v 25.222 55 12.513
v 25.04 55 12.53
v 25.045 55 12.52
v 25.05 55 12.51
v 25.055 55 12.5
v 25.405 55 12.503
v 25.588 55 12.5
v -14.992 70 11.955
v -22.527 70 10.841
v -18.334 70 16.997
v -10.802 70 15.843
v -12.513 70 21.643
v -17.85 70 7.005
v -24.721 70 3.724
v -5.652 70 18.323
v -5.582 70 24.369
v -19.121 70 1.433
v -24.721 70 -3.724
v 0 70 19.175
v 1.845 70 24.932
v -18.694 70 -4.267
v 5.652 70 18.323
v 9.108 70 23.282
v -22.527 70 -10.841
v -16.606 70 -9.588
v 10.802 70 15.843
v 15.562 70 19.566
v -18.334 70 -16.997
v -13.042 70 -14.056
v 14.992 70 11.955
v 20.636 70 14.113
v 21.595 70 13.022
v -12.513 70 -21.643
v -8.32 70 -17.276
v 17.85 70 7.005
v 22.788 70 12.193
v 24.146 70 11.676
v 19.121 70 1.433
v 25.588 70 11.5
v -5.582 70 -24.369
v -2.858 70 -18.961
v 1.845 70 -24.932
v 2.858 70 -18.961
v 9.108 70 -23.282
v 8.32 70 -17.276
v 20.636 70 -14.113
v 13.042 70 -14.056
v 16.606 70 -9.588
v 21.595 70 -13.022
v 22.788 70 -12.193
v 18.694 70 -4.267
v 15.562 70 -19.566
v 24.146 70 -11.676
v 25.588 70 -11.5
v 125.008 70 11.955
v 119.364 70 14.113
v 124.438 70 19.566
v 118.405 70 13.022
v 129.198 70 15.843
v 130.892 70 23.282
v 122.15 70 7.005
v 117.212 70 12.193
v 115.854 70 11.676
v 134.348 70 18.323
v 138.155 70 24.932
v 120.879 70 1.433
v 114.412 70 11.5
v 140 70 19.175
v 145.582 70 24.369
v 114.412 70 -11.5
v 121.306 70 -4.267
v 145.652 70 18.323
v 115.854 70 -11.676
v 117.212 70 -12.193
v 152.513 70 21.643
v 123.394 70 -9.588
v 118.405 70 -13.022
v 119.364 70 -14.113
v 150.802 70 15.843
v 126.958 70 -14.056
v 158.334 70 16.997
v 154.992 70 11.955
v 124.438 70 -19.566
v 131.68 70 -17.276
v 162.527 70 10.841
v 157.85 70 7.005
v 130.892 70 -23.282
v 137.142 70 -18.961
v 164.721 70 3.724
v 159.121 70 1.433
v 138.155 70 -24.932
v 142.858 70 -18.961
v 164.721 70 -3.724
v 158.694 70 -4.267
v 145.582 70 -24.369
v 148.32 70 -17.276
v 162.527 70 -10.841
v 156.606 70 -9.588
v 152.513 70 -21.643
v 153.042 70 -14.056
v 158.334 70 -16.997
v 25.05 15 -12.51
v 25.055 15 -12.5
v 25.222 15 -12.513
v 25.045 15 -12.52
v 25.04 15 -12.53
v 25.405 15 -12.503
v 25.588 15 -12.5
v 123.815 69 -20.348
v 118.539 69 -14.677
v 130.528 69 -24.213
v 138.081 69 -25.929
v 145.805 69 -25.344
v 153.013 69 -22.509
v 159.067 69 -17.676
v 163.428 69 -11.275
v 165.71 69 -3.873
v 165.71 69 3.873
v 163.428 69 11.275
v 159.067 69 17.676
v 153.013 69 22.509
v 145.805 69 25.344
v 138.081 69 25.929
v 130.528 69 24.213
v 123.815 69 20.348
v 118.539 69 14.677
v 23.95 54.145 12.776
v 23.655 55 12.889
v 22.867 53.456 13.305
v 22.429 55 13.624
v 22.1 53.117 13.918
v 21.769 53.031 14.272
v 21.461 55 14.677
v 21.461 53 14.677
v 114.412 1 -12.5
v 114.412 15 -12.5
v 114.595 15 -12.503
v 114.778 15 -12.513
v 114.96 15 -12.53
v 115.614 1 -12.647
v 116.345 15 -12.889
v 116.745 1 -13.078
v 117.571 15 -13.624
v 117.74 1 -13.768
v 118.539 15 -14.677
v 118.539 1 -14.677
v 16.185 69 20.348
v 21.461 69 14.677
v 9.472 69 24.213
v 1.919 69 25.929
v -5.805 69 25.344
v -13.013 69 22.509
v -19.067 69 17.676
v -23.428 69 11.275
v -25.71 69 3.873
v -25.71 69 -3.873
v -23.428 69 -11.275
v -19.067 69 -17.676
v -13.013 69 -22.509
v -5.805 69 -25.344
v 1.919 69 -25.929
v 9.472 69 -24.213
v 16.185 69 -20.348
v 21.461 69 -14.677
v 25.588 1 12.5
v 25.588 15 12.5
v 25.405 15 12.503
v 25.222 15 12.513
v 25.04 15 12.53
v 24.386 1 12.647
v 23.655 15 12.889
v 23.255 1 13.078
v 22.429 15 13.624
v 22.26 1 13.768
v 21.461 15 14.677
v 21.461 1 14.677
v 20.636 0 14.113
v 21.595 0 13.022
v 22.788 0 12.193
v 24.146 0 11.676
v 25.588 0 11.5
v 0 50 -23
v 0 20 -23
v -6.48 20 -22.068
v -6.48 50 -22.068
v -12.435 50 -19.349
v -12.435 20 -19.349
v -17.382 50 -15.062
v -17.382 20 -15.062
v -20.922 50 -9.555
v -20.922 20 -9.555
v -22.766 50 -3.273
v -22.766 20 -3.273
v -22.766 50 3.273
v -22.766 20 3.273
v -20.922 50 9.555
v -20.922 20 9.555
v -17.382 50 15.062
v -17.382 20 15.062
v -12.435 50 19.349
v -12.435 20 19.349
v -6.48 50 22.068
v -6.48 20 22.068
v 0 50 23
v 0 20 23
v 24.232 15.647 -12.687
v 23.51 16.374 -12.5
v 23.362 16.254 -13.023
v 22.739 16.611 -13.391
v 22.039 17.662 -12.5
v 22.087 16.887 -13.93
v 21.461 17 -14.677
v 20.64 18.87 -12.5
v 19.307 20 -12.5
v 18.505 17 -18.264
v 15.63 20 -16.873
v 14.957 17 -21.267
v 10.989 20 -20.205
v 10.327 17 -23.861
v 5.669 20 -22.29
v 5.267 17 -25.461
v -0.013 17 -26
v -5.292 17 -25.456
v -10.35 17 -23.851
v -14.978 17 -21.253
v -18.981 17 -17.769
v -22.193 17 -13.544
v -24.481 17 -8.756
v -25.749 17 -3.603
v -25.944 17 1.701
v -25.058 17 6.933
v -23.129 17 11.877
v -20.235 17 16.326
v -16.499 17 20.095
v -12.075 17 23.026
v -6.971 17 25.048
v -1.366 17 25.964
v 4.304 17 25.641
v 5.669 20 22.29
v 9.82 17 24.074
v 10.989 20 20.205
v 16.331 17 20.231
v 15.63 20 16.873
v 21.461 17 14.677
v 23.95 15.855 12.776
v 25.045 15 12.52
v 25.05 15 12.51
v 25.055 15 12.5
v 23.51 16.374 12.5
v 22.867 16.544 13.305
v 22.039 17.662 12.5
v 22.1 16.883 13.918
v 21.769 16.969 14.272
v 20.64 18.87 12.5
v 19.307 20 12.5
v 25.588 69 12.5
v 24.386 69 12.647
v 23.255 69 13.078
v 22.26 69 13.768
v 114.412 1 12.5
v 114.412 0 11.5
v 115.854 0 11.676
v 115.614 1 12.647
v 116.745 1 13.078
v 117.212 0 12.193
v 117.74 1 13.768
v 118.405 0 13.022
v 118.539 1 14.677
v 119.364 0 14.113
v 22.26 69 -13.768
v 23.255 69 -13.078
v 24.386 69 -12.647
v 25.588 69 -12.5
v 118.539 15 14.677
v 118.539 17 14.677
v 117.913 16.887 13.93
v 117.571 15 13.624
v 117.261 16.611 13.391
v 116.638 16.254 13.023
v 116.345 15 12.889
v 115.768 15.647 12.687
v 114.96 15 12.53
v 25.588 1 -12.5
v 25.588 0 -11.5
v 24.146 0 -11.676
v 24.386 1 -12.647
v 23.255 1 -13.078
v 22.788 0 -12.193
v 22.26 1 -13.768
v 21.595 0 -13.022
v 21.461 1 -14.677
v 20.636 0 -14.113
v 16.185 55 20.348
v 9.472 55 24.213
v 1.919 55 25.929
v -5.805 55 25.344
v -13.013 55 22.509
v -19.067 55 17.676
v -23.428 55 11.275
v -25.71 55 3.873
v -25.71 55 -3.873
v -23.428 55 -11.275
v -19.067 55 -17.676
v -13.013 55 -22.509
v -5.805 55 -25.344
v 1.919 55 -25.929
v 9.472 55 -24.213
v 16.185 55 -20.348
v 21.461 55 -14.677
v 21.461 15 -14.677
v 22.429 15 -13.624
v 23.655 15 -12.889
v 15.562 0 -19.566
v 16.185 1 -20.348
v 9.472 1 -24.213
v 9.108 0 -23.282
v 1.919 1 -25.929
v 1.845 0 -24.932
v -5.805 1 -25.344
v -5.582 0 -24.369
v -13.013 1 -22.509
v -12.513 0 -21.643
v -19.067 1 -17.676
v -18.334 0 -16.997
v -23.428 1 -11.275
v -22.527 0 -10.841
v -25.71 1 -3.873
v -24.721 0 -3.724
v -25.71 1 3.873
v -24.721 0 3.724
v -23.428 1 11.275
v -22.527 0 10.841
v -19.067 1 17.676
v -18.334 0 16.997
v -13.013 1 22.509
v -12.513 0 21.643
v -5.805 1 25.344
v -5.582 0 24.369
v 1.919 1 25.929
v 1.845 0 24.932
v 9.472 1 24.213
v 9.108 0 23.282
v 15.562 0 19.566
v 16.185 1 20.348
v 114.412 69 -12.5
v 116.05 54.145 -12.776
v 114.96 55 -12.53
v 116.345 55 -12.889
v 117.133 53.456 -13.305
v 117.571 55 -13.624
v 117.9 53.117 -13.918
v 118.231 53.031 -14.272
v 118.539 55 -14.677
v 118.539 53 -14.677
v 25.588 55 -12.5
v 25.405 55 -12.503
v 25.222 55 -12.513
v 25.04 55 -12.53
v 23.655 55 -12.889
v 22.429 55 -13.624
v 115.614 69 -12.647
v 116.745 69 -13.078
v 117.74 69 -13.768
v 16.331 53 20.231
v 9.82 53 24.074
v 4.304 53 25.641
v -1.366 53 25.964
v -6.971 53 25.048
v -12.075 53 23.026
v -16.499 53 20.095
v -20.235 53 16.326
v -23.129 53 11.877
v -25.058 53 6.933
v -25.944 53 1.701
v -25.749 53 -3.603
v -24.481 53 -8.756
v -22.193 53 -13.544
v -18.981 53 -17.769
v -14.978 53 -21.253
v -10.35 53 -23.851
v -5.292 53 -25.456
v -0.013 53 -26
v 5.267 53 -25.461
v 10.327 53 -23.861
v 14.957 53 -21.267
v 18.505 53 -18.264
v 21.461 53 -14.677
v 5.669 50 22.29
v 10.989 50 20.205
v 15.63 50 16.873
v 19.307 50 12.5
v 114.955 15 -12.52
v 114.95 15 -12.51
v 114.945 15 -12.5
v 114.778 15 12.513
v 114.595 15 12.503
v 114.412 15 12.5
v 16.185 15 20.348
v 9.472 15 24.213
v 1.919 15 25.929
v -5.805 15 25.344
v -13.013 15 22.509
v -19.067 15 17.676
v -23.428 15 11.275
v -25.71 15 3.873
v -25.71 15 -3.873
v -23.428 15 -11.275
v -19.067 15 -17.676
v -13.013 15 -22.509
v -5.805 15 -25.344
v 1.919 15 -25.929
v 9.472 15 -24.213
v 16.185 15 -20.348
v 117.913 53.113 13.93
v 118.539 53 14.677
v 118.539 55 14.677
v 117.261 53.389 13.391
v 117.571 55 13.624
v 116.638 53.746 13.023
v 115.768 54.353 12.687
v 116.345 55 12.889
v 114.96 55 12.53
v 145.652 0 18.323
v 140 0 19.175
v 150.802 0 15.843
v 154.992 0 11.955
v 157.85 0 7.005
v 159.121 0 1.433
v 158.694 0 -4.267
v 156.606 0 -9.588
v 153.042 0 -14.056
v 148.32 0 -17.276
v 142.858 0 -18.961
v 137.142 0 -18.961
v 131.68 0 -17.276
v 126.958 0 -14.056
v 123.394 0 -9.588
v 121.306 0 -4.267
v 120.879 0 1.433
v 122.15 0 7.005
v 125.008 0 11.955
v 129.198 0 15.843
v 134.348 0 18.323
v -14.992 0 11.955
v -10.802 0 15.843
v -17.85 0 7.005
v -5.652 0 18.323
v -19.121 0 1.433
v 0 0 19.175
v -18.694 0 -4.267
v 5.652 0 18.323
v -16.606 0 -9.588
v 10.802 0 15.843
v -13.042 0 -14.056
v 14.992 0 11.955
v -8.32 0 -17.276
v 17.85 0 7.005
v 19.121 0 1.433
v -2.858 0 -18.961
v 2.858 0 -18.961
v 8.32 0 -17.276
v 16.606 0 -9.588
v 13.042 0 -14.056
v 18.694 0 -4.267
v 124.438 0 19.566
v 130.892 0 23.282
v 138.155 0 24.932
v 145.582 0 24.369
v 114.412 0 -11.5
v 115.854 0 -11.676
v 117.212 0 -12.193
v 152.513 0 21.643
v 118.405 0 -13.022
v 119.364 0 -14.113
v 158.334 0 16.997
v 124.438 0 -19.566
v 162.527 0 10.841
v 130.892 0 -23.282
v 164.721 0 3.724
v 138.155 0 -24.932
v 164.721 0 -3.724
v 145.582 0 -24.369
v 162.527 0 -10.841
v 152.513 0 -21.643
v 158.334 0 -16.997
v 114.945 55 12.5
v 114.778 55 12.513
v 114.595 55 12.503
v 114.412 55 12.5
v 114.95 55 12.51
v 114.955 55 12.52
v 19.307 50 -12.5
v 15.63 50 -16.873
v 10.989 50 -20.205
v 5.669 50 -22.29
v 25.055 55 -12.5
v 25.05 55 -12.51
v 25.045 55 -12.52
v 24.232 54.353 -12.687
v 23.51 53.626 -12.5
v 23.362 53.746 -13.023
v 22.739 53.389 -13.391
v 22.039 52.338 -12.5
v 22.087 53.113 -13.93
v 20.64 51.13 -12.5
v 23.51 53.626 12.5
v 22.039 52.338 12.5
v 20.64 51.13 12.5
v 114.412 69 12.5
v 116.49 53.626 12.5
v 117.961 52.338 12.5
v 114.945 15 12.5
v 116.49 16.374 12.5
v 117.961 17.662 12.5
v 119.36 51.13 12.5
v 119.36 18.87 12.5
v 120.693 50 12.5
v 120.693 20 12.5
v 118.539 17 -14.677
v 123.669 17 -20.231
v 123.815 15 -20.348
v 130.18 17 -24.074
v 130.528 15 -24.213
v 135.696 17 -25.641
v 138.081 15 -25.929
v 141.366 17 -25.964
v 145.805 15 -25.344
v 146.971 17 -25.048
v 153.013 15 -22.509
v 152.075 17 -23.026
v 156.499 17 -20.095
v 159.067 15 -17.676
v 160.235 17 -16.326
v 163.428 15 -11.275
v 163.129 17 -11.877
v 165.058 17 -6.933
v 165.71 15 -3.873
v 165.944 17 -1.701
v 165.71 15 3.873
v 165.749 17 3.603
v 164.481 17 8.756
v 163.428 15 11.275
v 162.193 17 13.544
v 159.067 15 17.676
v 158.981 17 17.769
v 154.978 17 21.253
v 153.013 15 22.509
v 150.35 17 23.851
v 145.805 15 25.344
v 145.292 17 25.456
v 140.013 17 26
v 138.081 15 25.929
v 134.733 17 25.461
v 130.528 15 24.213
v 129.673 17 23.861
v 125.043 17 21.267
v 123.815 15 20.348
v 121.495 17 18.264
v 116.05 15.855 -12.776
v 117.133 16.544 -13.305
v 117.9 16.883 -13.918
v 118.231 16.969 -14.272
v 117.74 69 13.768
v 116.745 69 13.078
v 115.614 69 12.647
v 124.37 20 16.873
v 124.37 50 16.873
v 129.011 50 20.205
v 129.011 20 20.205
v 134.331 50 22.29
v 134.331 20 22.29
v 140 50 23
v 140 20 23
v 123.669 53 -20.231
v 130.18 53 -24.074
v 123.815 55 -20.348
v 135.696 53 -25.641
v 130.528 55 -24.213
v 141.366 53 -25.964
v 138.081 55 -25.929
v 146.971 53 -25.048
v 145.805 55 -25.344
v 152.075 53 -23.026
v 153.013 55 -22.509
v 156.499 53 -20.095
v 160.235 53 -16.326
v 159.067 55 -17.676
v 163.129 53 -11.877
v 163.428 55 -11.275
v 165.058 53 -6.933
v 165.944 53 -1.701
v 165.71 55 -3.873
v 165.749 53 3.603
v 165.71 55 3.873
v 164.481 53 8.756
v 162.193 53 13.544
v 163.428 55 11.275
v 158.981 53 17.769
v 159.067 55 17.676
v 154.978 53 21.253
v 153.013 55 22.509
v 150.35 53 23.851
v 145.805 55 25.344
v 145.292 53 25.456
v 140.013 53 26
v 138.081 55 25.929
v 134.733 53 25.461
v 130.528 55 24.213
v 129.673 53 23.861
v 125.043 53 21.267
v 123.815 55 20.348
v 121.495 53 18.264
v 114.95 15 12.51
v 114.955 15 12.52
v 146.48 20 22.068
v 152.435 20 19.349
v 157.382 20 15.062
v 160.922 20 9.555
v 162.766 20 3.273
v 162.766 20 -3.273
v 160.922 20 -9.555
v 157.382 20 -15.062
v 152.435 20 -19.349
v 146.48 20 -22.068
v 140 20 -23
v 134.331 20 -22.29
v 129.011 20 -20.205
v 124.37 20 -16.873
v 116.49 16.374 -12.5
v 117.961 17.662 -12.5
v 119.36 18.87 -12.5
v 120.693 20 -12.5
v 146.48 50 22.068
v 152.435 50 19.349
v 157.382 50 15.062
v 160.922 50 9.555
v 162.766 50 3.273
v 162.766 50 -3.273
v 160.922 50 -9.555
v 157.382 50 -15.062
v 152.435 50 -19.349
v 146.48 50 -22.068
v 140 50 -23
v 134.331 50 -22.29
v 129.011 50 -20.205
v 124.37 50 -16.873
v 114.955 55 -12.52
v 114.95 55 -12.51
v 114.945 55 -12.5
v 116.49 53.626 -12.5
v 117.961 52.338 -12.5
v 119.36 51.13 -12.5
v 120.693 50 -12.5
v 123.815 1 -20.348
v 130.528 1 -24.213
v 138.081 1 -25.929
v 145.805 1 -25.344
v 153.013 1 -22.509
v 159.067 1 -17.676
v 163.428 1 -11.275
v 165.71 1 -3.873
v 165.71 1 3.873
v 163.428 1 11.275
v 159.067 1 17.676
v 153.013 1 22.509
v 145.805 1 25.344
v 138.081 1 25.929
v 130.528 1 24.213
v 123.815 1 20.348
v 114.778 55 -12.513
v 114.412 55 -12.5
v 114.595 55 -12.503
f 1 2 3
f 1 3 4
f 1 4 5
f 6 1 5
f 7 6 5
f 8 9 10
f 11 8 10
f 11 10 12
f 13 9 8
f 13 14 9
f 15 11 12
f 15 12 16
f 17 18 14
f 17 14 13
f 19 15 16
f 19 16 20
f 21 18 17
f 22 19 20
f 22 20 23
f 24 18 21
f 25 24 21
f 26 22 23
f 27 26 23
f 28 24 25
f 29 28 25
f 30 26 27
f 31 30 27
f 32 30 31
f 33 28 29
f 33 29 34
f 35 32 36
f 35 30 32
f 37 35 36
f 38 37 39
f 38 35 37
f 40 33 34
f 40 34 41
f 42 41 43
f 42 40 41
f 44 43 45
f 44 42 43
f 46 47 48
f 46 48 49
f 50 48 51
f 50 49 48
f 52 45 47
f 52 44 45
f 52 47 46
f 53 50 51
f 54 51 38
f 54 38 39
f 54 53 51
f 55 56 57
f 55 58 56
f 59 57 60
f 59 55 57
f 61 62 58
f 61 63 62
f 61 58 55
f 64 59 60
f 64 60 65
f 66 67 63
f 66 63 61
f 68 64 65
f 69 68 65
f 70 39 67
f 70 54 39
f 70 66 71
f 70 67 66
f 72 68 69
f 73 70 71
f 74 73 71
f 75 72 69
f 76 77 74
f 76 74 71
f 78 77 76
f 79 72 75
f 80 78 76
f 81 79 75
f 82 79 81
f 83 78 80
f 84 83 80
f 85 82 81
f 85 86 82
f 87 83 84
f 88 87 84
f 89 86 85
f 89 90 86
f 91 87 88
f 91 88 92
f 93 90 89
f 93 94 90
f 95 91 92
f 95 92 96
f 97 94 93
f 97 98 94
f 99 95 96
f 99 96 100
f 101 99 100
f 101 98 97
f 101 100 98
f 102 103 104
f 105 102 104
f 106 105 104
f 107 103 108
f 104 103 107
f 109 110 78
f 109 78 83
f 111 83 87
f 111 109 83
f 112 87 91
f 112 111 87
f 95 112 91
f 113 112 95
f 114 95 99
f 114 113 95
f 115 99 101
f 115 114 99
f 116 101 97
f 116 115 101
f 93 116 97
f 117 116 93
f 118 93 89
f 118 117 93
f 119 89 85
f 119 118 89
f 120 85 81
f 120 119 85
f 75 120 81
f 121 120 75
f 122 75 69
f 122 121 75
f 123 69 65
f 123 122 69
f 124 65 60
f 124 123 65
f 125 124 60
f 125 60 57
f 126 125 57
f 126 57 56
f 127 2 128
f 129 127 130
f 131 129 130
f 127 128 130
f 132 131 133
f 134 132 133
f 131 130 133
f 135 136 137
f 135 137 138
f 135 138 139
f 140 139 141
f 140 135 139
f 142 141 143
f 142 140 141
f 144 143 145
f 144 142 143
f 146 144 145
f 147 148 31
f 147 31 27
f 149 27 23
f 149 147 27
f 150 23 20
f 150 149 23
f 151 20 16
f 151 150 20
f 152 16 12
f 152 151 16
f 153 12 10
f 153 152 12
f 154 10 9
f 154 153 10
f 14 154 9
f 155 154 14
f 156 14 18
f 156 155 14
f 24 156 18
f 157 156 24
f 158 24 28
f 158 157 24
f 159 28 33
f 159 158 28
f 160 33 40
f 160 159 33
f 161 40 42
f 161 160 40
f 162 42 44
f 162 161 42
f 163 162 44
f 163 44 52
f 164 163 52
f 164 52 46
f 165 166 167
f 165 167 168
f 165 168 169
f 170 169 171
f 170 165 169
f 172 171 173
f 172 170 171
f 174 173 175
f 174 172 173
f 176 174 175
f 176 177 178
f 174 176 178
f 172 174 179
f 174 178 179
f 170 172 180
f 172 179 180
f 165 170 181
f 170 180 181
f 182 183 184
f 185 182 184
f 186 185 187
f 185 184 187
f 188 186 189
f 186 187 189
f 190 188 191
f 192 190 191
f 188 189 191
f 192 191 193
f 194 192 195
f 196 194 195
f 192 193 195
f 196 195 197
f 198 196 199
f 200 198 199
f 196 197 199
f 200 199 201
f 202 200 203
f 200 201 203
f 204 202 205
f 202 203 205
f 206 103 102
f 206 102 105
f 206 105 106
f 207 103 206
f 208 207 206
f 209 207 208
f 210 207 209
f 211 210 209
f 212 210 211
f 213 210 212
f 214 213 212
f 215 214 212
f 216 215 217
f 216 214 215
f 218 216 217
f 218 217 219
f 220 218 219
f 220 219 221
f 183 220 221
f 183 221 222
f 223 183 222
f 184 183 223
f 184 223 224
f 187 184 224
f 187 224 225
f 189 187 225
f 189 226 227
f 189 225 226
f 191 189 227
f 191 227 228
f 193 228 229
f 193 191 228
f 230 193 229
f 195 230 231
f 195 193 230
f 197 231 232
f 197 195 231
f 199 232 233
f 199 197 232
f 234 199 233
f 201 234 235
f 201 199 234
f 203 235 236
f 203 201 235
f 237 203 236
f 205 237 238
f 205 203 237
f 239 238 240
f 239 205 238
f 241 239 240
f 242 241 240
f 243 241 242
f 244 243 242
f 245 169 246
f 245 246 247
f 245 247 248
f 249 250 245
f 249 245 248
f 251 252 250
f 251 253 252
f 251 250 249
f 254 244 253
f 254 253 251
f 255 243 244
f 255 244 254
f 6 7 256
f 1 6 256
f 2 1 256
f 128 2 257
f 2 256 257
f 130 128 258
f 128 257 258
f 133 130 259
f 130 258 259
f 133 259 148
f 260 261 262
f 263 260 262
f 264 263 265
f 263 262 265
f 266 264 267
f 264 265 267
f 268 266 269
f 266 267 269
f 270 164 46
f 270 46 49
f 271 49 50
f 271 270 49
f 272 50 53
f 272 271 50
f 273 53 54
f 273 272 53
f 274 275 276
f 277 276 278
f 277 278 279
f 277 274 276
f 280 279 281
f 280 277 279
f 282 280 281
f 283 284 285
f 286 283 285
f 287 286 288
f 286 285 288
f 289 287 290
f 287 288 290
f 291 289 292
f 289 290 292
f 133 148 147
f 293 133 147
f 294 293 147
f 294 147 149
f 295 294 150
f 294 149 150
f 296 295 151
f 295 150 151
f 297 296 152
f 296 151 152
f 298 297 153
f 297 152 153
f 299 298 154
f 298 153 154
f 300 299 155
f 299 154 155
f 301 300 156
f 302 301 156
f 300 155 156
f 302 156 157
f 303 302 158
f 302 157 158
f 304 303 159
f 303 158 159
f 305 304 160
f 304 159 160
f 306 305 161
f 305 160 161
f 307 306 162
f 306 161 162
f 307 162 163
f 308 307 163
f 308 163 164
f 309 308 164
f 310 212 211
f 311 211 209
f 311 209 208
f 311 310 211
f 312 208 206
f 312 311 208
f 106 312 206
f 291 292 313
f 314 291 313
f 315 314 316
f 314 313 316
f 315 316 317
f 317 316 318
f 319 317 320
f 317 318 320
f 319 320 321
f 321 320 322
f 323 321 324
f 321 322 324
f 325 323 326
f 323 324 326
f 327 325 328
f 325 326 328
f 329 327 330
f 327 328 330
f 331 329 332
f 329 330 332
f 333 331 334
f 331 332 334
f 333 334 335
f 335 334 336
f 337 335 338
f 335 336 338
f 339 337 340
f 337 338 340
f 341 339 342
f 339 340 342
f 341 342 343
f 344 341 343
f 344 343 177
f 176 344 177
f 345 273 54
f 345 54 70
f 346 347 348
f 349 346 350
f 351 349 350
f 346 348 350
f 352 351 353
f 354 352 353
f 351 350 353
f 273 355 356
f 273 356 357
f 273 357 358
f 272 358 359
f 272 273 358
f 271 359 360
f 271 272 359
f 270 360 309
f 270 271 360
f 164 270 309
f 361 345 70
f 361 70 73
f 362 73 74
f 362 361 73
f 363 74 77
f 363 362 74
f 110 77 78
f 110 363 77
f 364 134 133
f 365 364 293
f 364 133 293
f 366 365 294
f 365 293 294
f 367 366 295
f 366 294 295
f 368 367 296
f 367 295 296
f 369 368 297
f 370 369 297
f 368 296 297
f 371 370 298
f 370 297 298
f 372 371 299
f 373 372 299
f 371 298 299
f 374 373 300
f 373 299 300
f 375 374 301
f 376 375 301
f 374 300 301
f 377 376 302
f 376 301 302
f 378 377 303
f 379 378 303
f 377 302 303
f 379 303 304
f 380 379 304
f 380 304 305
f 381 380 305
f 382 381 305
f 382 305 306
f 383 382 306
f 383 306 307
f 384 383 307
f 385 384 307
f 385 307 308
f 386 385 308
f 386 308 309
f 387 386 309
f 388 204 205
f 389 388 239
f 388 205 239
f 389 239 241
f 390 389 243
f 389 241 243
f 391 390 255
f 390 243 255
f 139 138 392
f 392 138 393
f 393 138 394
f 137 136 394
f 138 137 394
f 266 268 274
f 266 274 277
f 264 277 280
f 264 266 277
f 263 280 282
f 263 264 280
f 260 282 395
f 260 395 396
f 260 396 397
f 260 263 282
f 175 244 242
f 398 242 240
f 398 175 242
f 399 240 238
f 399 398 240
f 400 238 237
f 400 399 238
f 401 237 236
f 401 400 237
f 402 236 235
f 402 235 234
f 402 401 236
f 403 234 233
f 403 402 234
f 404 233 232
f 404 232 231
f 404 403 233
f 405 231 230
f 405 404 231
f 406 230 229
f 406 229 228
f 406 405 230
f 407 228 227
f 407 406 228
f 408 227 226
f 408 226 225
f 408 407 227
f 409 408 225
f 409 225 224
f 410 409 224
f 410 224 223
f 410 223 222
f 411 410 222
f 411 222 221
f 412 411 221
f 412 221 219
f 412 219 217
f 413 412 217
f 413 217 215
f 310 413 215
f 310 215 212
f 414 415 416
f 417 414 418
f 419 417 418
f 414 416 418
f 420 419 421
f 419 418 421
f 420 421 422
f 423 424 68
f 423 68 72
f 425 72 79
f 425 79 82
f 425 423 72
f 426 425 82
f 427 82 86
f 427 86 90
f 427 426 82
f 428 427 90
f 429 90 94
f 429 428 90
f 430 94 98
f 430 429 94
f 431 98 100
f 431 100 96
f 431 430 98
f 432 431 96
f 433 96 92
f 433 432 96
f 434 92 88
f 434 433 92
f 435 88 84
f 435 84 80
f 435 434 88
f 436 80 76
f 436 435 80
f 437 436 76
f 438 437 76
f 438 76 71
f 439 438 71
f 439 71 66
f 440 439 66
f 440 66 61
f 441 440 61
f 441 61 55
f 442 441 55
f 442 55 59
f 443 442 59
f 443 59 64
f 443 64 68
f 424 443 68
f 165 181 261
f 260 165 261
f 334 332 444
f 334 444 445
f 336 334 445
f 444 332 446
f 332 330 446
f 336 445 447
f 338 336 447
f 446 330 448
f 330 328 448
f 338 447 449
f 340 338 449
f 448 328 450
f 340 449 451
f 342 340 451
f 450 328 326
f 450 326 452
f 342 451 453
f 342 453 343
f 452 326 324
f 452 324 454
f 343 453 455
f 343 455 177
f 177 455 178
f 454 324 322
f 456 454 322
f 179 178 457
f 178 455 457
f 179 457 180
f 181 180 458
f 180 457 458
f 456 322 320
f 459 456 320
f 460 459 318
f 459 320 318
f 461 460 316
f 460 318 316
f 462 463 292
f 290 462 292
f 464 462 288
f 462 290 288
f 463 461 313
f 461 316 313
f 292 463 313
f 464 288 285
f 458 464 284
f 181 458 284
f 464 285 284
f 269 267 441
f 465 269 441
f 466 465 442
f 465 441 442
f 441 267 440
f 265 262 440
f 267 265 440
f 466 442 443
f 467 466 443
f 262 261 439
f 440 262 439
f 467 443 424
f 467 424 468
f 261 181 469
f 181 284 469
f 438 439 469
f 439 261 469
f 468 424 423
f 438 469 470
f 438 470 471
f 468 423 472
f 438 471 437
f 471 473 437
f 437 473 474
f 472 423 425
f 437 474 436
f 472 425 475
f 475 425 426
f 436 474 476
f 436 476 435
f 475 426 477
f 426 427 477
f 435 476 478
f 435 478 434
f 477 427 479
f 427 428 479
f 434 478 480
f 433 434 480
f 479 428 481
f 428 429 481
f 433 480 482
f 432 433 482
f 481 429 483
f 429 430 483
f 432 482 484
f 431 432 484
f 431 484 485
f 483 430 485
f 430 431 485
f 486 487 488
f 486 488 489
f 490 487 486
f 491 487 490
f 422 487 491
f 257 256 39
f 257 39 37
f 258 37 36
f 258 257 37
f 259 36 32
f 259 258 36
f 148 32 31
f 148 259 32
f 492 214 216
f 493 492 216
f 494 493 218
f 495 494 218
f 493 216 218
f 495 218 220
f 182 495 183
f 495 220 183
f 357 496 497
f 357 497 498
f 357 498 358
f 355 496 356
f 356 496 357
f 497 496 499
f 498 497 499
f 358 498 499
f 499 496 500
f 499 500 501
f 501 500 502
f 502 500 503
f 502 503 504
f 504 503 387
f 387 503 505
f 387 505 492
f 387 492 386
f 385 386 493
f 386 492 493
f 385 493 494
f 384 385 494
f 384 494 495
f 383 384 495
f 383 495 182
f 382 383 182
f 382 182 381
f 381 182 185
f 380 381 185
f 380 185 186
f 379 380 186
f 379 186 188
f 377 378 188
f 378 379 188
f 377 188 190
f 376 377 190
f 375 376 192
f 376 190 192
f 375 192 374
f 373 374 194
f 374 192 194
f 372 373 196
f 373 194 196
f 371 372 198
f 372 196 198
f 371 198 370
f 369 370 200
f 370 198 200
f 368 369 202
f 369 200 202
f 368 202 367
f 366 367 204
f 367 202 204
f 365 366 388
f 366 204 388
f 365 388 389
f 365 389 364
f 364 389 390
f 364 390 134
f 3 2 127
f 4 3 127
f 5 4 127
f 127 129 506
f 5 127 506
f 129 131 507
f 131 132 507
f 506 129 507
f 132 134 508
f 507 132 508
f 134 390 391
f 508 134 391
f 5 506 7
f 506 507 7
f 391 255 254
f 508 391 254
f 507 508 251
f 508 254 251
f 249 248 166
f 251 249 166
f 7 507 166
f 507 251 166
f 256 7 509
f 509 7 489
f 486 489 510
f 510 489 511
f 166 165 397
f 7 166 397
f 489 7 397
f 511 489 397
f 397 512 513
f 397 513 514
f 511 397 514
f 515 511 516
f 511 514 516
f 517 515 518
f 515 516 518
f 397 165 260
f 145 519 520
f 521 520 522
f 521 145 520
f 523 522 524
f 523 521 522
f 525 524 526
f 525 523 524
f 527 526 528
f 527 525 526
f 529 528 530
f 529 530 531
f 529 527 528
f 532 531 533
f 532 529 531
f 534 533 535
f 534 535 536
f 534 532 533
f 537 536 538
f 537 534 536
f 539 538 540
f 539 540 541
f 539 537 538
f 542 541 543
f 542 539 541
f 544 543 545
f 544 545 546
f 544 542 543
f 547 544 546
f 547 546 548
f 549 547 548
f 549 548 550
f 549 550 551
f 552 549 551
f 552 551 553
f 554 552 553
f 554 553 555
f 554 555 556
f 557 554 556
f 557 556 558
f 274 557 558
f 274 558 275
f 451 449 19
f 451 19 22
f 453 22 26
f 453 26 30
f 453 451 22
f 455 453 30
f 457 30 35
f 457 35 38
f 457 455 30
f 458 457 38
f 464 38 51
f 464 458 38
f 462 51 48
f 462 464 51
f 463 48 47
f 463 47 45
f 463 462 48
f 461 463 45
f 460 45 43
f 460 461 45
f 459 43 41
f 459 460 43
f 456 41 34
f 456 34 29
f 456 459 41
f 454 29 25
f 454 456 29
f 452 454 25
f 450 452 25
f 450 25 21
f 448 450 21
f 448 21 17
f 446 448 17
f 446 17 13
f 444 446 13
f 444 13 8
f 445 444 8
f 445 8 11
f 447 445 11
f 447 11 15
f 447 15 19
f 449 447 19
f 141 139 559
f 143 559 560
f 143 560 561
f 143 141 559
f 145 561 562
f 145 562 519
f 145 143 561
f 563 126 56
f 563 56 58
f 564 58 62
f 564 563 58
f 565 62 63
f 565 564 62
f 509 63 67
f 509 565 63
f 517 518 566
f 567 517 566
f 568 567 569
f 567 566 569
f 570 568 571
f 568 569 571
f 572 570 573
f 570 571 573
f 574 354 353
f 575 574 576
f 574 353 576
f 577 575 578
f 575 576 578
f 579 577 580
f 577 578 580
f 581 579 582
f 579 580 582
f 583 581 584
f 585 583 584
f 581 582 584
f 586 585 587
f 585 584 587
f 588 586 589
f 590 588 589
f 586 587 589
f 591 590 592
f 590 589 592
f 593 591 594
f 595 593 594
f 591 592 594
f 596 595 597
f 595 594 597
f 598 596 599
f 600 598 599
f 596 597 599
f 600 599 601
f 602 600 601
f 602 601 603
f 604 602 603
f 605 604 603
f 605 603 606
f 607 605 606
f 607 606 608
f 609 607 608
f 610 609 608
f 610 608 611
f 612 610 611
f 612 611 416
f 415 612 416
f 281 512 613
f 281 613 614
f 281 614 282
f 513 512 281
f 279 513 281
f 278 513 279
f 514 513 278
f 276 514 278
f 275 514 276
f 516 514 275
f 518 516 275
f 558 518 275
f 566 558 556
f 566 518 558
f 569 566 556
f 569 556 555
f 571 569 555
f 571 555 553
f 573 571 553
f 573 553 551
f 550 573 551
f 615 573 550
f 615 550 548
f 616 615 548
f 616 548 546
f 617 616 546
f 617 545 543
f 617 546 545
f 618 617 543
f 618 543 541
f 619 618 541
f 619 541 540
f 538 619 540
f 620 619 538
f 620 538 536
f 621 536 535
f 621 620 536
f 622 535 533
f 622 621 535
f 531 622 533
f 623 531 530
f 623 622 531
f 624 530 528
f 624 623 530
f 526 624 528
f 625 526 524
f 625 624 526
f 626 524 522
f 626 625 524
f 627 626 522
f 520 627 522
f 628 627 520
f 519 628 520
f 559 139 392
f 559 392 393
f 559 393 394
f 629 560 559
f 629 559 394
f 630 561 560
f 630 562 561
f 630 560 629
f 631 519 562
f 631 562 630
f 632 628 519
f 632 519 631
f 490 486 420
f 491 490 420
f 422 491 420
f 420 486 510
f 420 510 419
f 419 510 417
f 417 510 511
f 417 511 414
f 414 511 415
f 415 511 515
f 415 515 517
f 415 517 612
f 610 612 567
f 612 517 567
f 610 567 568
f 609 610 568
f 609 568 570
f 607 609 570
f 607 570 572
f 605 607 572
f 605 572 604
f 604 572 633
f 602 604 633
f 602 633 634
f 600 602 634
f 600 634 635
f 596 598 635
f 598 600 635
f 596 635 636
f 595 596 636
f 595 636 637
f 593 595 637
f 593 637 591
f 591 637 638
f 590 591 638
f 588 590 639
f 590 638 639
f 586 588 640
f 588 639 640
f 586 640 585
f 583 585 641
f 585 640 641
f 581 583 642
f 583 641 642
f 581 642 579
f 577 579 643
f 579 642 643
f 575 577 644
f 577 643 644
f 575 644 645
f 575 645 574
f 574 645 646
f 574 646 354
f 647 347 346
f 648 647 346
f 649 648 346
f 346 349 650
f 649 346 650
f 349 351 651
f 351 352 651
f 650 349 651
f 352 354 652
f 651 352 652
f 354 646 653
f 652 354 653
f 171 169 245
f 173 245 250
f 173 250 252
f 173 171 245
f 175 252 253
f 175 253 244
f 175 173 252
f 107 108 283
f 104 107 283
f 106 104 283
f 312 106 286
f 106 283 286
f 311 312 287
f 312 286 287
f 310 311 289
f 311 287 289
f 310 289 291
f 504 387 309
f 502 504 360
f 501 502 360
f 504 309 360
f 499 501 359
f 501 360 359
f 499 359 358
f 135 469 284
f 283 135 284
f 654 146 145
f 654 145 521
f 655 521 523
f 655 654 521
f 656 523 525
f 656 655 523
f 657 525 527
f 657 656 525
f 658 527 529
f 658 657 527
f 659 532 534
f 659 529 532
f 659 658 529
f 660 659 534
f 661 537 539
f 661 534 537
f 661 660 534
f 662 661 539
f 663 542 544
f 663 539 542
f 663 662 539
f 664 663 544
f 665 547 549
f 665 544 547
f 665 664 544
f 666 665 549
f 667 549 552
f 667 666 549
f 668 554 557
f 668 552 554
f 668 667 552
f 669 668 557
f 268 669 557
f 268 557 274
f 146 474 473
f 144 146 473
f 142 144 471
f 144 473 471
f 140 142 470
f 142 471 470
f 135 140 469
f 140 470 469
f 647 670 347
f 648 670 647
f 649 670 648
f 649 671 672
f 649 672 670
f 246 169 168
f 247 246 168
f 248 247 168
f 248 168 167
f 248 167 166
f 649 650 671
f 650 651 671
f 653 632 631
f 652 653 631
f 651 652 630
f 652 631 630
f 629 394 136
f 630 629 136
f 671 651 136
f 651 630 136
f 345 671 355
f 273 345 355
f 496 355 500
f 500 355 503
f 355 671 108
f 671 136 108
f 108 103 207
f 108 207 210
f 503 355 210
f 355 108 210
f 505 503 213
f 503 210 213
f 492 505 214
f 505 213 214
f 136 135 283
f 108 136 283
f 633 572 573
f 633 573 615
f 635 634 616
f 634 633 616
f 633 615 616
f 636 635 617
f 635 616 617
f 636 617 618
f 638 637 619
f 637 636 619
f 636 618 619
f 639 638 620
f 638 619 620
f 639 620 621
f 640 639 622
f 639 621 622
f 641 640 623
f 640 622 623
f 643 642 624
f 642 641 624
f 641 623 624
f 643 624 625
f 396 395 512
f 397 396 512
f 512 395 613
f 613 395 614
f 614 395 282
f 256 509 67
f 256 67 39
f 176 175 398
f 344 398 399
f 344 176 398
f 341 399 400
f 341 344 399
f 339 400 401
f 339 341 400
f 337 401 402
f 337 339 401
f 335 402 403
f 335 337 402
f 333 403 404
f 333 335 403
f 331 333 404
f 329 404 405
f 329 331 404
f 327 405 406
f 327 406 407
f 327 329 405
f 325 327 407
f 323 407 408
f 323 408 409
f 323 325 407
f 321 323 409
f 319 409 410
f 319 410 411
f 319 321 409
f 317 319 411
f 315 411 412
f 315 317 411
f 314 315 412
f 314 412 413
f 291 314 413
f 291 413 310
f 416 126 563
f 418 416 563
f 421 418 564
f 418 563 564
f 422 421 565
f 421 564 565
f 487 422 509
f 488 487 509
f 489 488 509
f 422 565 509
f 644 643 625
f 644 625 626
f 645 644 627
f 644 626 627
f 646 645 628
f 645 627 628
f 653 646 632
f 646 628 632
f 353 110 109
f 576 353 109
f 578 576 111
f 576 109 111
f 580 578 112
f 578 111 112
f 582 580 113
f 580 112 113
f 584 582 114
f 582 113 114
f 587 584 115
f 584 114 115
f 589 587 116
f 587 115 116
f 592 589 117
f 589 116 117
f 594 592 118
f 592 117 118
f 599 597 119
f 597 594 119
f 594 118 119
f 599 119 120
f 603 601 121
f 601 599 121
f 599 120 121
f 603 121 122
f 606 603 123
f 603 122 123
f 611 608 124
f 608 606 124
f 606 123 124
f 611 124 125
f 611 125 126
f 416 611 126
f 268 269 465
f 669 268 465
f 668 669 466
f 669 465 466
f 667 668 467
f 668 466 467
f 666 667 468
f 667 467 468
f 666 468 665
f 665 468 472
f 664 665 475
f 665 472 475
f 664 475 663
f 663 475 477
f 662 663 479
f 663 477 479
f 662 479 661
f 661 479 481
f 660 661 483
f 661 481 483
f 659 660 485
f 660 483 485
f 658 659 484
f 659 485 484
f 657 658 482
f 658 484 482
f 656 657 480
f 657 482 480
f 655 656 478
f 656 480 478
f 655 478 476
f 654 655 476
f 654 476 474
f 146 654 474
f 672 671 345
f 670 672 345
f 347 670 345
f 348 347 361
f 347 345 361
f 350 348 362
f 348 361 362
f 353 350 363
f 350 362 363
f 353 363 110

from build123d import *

# Parameters (mm, degrees)
SKETCH1_R            = 19.175
BOSS_EXTRUDE1_DEPTH  = 70
SKETCH3_R            = 26
SKETCH3_R_2          = 19.175
BOSS_EXTRUDE2_DEPTH  = 15
FILLET1_R            = 5
CHAMFER2_START       = 15
CHAMFER2_3_OUTLINE_W = 198
CHAMFER2_3_OUTLINE_H = 58
CHAMFER2_3_DEPTH     = 5
CHAMFER1_SIZE        = 1


with BuildPart() as part:
    # Sketch1 → Boss-Extrude1 (new body)
    with BuildSketch(Plane(origin=(0, 0, 0), x_dir=(1, 0, 0), z_dir=(0, 1, 0))):
        with BuildLine():
            Line((19.306734576, -12.5), (120.693265424, -12.5))
            ThreePointArc((120.693265424, -12.5), (129.011369512, -20.205197351), (140, -23))
            ThreePointArc((140, -23), (163, 0), (140, 23))
            ThreePointArc((140, 23), (129.011369512, 20.205197351), (120.693265424, 12.5))
            Line((120.693265424, 12.5), (19.306734576, 12.5))
            ThreePointArc((19.306734576, 12.5), (10.988630488, 20.205197351), (0, 23))
            ThreePointArc((0, 23), (-23, 0), (0, -23))
            ThreePointArc((0, -23), (10.988630488, -20.205197351), (19.306734576, -12.5))
        make_face()
        with Locations(Location((0, 0, 0), (0, 0, 270))):
            Circle(SKETCH1_R, mode=Mode.SUBTRACT)
        with Locations(Location((140, 0, 0), (0, 0, 270))):
            Circle(SKETCH1_R, mode=Mode.SUBTRACT)
    extrude(amount=BOSS_EXTRUDE1_DEPTH)

    # Sketch3 → Boss-Extrude2 (add)
    # profile 1 of 2: a face of its own
    with BuildSketch(Plane.XZ):
        Circle(SKETCH3_R)
        with Locations(Location((0, 0, 0), (0, 0, 90))):
            Circle(SKETCH3_R_2, mode=Mode.SUBTRACT)
    # profile 2 of 2: a face of its own
    with BuildSketch(Plane.XZ):
        with Locations((140, 0)):
            Circle(SKETCH3_R)
        with Locations(Location((140, 0, 0), (0, 0, 90))):
            Circle(SKETCH3_R_2, mode=Mode.SUBTRACT)
    extrude(amount=-BOSS_EXTRUDE2_DEPTH)

    # Fillet1
    fillet1_edges = [part.edges().sort_by_distance(p)[0] for p in [
        (22.79802623, 7.5, -12.5),
        (22.79802623, 7.5, 12.5),
        (117.20197377, 7.5, -12.5),
        (117.20197377, 7.5, 12.5),
    ]]
    fillet(fillet1_edges, radius=FILLET1_R)

    # Chamfer2: read off the stored shape, not the designer's step
    # Chamfer2 outline → Chamfer2 (revolve)
    with BuildSketch(Plane.XY):
        Polygon((28, 15), (23, 20), (23, 15), align=None)
    revolve(axis=Axis((0, 0, 0), (0, 1, 0)))

    # Chamfer2 2 outline → Chamfer2 2 (revolve)
    with BuildSketch(Plane(origin=(140, 0, 0), x_dir=(1, 0, 0), z_dir=(0, 0, 1))):
        Polygon((28, 15), (23, 20), (23, 15), align=None)
    revolve(axis=Axis((140, 0, 0), (0, 1, 0)))

    # Chamfer2 3 outline → Chamfer2 3 (cut)
    with BuildSketch(Plane(origin=(0, 0, 0), x_dir=(1, 0, 0), z_dir=(0, 1, 0)).offset(CHAMFER2_START)):
        with Locations((70, 0)):
            Rectangle(CHAMFER2_3_OUTLINE_W, CHAMFER2_3_OUTLINE_H)
        with BuildLine():
            ThreePointArc((25.588083164, -12.5), (23.254941851, -13.0777323), (21.460972976, -14.677419355))
            ThreePointArc((21.460972976, -14.677419355), (-26, 0), (21.460972976, 14.677419355))
            ThreePointArc((21.460972976, 14.677419355), (23.254941851, 13.0777323), (25.588083164, 12.5))
            Line((25.588083164, 12.5), (114.411916836, 12.5))
            ThreePointArc((114.411916836, 12.5), (116.745058149, 13.0777323), (118.539027024, 14.677419355))
            ThreePointArc((118.539027024, 14.677419355), (166, 0), (118.539027024, -14.677419355))
            ThreePointArc((118.539027024, -14.677419355), (116.745058149, -13.0777323), (114.411916836, -12.5))
            Line((114.411916836, -12.5), (25.588083164, -12.5))
        make_face(mode=Mode.SUBTRACT)
    extrude(amount=CHAMFER2_3_DEPTH, mode=Mode.SUBTRACT)

    # Mirror1: read off the stored shape, not the designer's step
    # Mirror1: part across plane


with BuildPart() as part_1:
    add(part.part)
    add(part.part.mirror(Plane(origin=(0, 35, 0), x_dir=(0, 0, 1), z_dir=(0, -1, 0))))

    # Chamfer1
    chamfer1_edges = [part_1.edges().sort_by_distance(p)[0] for p in [
        (166, 70, 0),
        (70, 70, -12.5),
        (70, 70, 12.5),
        (-26, 70, 0),
        (116.745058149, 70, -13.0777323),
        (116.745058149, 70, 13.0777323),
        (23.254941851, 70, -13.0777323),
        (23.254941851, 70, 13.0777323),
        (70, 0, -12.5),
        (166, 0, 0),
        (70, 0, 12.5),
        (-26, 0, 0),
        (116.745058149, 0, -13.0777323),
        (116.745058149, 0, 13.0777323),
        (23.254941851, 0, -13.0777323),
        (23.254941851, 0, 13.0777323),
    ]]
    chamfer(chamfer1_edges, length=CHAMFER1_SIZE)


solid = part_1.part
